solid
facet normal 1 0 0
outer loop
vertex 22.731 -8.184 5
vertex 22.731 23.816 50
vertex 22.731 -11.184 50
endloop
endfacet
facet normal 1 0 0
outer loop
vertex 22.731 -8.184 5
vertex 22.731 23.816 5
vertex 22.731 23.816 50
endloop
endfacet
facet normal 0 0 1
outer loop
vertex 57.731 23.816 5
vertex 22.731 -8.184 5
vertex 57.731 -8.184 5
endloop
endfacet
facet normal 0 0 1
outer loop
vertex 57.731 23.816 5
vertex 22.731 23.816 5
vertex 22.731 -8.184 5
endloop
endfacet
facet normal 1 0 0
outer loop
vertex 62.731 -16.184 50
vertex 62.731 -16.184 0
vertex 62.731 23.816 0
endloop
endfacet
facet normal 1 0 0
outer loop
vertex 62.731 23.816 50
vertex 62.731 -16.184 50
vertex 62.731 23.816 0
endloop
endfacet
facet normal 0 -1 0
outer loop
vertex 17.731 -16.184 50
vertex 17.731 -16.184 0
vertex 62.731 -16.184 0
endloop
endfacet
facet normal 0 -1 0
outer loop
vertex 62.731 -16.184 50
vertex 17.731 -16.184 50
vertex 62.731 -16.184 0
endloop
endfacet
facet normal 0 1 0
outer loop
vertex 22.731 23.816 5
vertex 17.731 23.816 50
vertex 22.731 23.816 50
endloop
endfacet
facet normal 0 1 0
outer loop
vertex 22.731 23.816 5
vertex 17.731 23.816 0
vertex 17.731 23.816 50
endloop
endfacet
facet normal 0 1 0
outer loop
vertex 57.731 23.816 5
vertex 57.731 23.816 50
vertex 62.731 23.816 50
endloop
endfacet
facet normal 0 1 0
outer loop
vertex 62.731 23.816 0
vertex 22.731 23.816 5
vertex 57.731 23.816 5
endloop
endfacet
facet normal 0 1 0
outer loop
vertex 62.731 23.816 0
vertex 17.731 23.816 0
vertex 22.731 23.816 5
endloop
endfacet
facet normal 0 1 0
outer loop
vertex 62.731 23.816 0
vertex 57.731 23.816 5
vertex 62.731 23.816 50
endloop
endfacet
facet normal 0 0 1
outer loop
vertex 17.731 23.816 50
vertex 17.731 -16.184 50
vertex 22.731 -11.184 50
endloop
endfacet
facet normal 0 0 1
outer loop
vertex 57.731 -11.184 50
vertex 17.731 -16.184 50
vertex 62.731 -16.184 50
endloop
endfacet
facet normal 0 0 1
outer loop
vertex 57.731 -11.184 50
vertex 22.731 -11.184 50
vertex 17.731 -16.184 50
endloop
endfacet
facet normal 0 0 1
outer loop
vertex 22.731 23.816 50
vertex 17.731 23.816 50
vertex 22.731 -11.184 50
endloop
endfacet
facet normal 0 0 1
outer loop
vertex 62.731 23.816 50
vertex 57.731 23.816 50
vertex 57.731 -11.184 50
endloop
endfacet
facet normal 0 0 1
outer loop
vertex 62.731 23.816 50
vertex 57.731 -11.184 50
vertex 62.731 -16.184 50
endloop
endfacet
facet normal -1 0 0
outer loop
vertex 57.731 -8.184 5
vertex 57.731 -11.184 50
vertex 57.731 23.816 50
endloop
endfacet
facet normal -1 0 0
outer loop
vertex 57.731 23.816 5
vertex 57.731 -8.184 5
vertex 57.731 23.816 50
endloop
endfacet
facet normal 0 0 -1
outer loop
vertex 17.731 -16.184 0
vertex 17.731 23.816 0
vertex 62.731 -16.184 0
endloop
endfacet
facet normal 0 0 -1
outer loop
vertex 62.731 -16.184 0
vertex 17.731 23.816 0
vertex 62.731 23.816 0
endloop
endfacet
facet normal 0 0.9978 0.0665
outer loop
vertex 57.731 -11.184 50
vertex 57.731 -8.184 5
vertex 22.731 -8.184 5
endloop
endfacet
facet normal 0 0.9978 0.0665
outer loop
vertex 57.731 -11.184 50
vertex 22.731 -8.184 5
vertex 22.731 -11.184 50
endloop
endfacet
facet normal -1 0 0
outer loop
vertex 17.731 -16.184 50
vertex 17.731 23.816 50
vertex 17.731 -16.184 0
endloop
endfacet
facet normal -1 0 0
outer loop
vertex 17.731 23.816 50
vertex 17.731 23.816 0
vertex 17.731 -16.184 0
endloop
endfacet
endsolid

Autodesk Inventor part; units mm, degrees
ref_plane "YZ Plane" through (0, 0, 0) normal (1, 0, 0) x (0, 1, 0)
ref_plane "XZ Plane" through (0, 0, 0) normal (0, 1, 0) x (-1, 0, 0)
ref_plane "XY Plane" through (0, 0, 0) normal (0, 0, 1) x (1, 0, 0)
sketch "Sketch1" plane through (0, 0, 0) normal (0, 0, 1) x (1, 0, 0)
  line L0 (22.7313, 23.816) -> (22.7313, -11.184)
  line L1 (22.7313, -11.184) -> (57.7313, -11.184)
  line L2 (57.7313, -11.184) -> (57.7313, 23.816)
  line L3 (17.7313, 23.816) -> (17.7313, -16.184)
  line L4 (17.7313, -16.184) -> (62.7313, -16.184)
  line L5 (62.7313, -16.184) -> (62.7313, 23.816)
  line L6 (17.7313, 23.816) -> (22.7313, 23.816)
  line L7 (57.7313, 23.816) -> (62.7313, 23.816)
  line L8 (17.7313, 23.816) -> (62.7313, 23.816)
  point P0 (0, 0)
  point P1 (57.7313, 23.816)
  dimension "d0" = 35
  dimension "d1" = 35
  dimension "d2" = 35
  dimension "d3" = 5
extrude "Extrusion1" add sketch "Sketch1" along normal blind 5
extrude "Extrusion2" add sketch "Sketch1" along normal blind 50 contours L0 L1 L2 L7 L5 L4 L3 L6
sketch "Sketch2" plane through (57.7313, -11.184, 5) normal (-1, 0, 0) x (0, 0, 1)
  line L0 (0, 35) -> (0, 0) projected
  line L1 (0, 0) -> (0, 3)
  line L2 (0, 0) -> (45, 0) projected
  line L3 (0, 3) -> (45, 0)
  line L4 (45, 0) -> (0, 3)
  point P0 (-5, 11.184)
  dimension "d8" = 3
extrude "Extrusion3" add sketch "Sketch2" along normal blind 35
properties part number "outstorage"
